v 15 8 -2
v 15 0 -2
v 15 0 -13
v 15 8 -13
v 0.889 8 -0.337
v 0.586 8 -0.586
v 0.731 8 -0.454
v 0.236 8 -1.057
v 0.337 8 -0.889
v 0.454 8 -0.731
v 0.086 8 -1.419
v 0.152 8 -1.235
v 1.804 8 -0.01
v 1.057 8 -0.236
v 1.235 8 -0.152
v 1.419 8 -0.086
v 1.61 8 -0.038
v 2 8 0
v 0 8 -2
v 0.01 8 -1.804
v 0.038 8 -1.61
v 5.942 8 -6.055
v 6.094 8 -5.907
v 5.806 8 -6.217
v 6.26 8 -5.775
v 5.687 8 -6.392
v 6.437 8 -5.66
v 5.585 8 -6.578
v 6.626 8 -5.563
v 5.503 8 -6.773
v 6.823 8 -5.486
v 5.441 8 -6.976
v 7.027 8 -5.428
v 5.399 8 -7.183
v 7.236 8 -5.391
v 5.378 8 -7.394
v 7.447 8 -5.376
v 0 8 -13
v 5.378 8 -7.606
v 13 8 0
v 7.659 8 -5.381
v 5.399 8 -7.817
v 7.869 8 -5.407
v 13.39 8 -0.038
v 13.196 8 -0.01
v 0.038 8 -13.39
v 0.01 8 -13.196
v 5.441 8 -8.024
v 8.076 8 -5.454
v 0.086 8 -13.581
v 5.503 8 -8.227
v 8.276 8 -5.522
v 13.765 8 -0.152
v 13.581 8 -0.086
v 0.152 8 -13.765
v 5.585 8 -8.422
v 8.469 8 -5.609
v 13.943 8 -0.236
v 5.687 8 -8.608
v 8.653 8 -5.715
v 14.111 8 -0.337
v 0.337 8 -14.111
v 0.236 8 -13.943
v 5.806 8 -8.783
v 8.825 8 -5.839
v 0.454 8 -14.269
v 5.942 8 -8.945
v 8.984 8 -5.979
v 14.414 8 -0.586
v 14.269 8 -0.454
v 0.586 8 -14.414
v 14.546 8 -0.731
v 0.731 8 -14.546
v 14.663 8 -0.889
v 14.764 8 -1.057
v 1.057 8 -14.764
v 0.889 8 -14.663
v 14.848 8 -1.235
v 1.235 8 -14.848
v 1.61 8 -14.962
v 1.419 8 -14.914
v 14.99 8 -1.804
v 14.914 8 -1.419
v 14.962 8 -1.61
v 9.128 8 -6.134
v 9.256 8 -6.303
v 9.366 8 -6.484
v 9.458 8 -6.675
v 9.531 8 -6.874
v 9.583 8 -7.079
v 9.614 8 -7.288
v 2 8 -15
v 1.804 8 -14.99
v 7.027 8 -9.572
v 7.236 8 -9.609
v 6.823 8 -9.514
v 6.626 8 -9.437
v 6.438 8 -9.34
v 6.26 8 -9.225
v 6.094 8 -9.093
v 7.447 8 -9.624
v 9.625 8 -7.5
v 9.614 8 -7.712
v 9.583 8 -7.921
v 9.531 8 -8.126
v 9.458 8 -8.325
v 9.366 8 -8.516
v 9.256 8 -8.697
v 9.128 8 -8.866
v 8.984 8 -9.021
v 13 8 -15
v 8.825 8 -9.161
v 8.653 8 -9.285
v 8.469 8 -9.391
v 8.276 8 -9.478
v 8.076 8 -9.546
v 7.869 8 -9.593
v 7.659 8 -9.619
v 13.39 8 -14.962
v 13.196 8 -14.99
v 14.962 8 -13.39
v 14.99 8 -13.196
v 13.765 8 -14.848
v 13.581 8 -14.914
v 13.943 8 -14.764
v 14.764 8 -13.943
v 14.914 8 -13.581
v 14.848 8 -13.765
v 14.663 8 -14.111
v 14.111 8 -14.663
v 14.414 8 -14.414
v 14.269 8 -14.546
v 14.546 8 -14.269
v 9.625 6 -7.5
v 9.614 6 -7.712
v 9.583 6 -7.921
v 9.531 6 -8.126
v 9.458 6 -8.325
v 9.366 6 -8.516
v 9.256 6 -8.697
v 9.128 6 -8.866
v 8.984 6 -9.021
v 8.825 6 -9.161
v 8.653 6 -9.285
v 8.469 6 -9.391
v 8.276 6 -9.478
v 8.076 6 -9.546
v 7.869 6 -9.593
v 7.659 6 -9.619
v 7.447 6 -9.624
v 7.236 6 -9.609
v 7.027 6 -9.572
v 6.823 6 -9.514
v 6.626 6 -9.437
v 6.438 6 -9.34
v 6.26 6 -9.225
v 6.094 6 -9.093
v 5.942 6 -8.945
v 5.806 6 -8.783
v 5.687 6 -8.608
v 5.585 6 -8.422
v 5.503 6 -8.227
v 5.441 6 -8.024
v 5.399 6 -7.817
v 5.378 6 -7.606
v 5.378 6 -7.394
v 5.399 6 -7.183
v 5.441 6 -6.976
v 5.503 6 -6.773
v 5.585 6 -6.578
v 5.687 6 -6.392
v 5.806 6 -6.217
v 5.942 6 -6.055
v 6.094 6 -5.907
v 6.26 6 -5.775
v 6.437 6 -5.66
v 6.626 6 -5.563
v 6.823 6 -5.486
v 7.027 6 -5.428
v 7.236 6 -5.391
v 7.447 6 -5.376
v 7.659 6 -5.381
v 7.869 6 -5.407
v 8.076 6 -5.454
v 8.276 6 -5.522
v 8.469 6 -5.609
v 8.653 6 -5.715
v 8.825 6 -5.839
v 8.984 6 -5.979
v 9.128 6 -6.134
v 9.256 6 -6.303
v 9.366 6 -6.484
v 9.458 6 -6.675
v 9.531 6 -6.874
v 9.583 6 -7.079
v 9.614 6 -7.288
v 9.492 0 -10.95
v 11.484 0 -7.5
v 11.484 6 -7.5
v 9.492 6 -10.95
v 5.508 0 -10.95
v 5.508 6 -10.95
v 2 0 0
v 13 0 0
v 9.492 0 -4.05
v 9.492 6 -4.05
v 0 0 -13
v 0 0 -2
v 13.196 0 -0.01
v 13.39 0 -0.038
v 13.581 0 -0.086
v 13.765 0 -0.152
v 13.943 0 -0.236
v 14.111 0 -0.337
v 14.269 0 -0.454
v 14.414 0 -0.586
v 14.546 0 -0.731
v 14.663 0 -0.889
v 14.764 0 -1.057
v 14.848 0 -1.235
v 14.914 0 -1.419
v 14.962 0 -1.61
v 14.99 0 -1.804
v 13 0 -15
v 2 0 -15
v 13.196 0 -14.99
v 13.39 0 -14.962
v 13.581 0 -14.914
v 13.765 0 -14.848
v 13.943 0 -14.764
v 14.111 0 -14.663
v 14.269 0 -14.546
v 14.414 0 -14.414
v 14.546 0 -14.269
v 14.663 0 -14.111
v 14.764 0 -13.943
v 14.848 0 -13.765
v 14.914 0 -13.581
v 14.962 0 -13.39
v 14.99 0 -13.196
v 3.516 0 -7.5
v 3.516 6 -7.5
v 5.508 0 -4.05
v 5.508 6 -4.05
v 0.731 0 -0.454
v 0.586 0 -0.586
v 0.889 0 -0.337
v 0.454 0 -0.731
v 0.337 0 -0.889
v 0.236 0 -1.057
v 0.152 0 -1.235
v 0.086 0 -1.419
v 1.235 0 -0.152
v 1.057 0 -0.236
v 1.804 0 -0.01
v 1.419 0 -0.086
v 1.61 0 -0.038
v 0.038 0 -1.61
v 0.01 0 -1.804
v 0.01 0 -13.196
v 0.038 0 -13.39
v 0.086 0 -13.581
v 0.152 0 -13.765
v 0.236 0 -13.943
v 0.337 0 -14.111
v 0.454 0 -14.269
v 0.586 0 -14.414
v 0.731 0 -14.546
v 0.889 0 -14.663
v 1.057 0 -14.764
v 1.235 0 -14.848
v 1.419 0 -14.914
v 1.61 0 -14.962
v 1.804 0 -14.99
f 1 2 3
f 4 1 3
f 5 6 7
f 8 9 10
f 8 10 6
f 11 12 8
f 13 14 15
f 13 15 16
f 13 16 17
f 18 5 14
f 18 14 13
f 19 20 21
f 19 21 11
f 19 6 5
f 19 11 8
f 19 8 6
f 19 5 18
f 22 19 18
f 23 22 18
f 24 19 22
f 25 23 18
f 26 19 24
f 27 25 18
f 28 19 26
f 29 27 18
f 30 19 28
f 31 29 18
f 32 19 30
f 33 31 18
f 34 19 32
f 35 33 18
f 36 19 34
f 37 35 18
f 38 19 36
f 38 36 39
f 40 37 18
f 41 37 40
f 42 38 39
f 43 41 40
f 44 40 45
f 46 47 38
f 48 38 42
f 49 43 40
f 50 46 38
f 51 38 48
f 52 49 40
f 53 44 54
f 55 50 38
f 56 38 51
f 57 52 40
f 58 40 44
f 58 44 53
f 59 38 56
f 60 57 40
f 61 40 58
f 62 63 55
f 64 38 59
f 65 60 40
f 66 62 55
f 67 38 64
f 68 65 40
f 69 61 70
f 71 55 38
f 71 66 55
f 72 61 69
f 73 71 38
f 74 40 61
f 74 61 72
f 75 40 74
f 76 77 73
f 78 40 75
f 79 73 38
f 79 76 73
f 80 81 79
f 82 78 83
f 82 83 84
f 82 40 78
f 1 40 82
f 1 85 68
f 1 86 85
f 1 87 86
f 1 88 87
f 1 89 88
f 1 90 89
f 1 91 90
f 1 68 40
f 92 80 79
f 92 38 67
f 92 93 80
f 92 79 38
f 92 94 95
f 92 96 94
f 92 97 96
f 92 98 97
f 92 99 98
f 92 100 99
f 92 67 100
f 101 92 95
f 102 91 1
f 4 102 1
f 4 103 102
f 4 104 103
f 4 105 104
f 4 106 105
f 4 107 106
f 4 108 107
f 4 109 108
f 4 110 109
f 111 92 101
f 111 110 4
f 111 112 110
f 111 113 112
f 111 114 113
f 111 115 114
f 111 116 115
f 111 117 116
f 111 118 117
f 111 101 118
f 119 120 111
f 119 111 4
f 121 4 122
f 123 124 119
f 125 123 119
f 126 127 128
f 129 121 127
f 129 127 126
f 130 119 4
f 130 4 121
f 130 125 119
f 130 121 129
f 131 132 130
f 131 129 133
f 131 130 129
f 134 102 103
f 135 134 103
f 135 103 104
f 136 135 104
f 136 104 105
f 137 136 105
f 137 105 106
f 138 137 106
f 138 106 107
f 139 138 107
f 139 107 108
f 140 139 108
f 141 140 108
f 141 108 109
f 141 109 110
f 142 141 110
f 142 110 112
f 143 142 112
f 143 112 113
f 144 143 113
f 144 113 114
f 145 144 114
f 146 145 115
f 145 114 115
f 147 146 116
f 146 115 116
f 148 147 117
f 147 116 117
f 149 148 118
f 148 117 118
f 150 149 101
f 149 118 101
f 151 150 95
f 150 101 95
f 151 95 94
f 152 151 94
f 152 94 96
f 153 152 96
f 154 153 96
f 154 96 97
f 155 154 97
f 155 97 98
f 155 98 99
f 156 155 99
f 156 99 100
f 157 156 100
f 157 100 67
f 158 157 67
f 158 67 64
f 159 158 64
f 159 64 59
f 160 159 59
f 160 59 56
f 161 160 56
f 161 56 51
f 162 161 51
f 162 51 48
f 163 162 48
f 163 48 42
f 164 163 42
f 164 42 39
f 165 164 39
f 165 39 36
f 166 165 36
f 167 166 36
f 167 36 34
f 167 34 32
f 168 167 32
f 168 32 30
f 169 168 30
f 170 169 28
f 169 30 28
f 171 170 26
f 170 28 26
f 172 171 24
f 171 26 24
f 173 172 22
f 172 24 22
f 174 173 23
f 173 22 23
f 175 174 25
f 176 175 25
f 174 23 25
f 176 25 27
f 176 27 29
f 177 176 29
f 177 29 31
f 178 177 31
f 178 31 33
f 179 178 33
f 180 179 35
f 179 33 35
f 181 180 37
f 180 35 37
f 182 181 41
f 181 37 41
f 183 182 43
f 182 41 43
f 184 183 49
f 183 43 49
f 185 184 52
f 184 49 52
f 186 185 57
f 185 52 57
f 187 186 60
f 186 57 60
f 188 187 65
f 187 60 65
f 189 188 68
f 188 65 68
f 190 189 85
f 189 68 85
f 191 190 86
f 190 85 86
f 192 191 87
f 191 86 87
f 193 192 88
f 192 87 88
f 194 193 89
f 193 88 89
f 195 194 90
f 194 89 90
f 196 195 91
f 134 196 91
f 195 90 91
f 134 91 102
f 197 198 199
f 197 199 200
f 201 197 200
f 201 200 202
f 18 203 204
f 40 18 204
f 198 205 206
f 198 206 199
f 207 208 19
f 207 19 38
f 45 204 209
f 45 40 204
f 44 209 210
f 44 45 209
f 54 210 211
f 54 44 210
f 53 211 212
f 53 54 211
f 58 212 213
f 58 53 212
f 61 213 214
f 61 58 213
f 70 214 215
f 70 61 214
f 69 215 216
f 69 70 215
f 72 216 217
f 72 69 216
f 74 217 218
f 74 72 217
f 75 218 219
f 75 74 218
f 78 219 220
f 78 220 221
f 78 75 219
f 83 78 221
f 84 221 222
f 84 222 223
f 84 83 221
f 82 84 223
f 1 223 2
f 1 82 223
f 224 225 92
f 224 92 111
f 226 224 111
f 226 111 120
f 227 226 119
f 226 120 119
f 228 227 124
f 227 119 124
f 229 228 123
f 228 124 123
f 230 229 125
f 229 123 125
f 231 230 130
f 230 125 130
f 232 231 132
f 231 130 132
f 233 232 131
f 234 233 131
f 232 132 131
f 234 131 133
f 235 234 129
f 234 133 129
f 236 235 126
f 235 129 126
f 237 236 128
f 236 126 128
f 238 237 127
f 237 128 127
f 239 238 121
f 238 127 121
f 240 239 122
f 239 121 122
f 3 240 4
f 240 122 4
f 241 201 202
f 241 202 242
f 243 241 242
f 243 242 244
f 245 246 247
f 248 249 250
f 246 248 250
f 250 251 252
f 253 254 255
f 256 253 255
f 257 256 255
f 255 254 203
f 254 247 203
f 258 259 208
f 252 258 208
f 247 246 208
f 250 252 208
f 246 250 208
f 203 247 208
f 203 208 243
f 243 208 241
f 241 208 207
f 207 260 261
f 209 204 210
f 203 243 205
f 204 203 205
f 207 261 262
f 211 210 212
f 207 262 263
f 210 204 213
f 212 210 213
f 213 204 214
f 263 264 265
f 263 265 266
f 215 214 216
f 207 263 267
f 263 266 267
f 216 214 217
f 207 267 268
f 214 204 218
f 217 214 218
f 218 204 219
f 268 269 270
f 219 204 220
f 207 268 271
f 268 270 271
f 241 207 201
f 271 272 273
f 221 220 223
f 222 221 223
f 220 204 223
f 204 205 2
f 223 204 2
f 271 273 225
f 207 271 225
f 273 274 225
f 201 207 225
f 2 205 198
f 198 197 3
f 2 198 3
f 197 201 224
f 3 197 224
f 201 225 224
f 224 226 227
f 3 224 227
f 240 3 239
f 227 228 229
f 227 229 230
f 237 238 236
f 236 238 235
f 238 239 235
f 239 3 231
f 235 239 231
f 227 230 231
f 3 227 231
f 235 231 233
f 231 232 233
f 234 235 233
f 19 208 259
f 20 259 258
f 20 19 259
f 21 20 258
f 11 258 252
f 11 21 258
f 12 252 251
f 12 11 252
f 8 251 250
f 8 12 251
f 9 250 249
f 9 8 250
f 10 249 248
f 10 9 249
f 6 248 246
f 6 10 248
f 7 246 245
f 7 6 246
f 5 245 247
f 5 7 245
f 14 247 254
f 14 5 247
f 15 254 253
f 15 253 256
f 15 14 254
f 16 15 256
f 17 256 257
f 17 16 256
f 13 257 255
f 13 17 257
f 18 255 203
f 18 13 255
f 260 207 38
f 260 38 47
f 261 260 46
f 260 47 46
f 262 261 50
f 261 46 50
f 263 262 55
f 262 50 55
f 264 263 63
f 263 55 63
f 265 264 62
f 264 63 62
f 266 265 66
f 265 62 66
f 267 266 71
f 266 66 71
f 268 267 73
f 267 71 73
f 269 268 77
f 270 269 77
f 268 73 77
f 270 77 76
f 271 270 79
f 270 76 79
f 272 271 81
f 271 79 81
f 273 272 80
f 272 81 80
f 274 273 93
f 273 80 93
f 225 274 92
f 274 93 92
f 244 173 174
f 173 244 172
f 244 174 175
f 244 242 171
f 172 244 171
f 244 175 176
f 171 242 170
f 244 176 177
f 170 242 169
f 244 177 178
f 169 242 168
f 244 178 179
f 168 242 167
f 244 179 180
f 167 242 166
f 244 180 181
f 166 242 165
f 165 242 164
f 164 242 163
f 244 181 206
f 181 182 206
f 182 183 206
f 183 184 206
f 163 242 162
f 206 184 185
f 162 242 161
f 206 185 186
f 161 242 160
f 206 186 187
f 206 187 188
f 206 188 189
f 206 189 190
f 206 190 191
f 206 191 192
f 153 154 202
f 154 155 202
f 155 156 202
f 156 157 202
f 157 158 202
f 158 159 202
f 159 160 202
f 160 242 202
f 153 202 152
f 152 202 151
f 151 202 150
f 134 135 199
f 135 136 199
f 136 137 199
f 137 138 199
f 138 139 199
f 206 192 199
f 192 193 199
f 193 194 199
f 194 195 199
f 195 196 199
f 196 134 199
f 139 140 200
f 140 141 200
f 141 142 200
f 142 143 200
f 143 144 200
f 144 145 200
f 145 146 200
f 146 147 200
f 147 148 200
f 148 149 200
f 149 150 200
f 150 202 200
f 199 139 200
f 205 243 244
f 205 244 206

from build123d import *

# Parameters (mm, degrees)
SKETCH1_W           = 15
SKETCH1_H           = 15
BOSS_EXTRUDE1_DEPTH = 8
SKETCH3_R           = 2.125
CUT_EXTRUDE3_DEPTH  = 9
CUT_EXTRUDE2_DEPTH  = 6
FILLET1_R           = 2


with BuildPart() as part:
    # Sketch1 → Boss-Extrude1 (new body)
    with BuildSketch(Plane(origin=(0, 0, 0), x_dir=(1, 0, 0), z_dir=(0, 1, 0))):
        with Locations((7.5, 7.5)):
            Rectangle(SKETCH1_W, SKETCH1_H)
    extrude(amount=BOSS_EXTRUDE1_DEPTH)

    # Sketch3 → Cut-Extrude3 (cut, through all)
    with BuildSketch(Plane(origin=(0, 8, 0), x_dir=(1, 0, 0), z_dir=(0, 1, 0))):
        with Locations((7.5, 7.5)):
            Circle(SKETCH3_R)
    extrude(amount=-CUT_EXTRUDE3_DEPTH, mode=Mode.SUBTRACT)

    # Sketch2 → Cut-Extrude2 (cut)
    with BuildSketch(Plane(origin=(0, 0, 0), x_dir=(1, 0, 0), z_dir=(0, 1, 0))):
        Polygon((11.483716857, 7.5), (9.491858429, 10.95), (5.508141571, 10.95), (3.516283143, 7.5), (5.508141571, 4.05), (9.491858429, 4.05), align=None)
    extrude(amount=CUT_EXTRUDE2_DEPTH, mode=Mode.SUBTRACT)

    # Fillet1
    fillet1_edges = [part.edges().sort_by_distance(p)[0] for p in [
        (0, 4, -15),
        (15, 4, -15),
        (15, 4, 0),
        (0, 4, 0),
    ]]
    fillet(fillet1_edges, radius=FILLET1_R)


solid = part.part
